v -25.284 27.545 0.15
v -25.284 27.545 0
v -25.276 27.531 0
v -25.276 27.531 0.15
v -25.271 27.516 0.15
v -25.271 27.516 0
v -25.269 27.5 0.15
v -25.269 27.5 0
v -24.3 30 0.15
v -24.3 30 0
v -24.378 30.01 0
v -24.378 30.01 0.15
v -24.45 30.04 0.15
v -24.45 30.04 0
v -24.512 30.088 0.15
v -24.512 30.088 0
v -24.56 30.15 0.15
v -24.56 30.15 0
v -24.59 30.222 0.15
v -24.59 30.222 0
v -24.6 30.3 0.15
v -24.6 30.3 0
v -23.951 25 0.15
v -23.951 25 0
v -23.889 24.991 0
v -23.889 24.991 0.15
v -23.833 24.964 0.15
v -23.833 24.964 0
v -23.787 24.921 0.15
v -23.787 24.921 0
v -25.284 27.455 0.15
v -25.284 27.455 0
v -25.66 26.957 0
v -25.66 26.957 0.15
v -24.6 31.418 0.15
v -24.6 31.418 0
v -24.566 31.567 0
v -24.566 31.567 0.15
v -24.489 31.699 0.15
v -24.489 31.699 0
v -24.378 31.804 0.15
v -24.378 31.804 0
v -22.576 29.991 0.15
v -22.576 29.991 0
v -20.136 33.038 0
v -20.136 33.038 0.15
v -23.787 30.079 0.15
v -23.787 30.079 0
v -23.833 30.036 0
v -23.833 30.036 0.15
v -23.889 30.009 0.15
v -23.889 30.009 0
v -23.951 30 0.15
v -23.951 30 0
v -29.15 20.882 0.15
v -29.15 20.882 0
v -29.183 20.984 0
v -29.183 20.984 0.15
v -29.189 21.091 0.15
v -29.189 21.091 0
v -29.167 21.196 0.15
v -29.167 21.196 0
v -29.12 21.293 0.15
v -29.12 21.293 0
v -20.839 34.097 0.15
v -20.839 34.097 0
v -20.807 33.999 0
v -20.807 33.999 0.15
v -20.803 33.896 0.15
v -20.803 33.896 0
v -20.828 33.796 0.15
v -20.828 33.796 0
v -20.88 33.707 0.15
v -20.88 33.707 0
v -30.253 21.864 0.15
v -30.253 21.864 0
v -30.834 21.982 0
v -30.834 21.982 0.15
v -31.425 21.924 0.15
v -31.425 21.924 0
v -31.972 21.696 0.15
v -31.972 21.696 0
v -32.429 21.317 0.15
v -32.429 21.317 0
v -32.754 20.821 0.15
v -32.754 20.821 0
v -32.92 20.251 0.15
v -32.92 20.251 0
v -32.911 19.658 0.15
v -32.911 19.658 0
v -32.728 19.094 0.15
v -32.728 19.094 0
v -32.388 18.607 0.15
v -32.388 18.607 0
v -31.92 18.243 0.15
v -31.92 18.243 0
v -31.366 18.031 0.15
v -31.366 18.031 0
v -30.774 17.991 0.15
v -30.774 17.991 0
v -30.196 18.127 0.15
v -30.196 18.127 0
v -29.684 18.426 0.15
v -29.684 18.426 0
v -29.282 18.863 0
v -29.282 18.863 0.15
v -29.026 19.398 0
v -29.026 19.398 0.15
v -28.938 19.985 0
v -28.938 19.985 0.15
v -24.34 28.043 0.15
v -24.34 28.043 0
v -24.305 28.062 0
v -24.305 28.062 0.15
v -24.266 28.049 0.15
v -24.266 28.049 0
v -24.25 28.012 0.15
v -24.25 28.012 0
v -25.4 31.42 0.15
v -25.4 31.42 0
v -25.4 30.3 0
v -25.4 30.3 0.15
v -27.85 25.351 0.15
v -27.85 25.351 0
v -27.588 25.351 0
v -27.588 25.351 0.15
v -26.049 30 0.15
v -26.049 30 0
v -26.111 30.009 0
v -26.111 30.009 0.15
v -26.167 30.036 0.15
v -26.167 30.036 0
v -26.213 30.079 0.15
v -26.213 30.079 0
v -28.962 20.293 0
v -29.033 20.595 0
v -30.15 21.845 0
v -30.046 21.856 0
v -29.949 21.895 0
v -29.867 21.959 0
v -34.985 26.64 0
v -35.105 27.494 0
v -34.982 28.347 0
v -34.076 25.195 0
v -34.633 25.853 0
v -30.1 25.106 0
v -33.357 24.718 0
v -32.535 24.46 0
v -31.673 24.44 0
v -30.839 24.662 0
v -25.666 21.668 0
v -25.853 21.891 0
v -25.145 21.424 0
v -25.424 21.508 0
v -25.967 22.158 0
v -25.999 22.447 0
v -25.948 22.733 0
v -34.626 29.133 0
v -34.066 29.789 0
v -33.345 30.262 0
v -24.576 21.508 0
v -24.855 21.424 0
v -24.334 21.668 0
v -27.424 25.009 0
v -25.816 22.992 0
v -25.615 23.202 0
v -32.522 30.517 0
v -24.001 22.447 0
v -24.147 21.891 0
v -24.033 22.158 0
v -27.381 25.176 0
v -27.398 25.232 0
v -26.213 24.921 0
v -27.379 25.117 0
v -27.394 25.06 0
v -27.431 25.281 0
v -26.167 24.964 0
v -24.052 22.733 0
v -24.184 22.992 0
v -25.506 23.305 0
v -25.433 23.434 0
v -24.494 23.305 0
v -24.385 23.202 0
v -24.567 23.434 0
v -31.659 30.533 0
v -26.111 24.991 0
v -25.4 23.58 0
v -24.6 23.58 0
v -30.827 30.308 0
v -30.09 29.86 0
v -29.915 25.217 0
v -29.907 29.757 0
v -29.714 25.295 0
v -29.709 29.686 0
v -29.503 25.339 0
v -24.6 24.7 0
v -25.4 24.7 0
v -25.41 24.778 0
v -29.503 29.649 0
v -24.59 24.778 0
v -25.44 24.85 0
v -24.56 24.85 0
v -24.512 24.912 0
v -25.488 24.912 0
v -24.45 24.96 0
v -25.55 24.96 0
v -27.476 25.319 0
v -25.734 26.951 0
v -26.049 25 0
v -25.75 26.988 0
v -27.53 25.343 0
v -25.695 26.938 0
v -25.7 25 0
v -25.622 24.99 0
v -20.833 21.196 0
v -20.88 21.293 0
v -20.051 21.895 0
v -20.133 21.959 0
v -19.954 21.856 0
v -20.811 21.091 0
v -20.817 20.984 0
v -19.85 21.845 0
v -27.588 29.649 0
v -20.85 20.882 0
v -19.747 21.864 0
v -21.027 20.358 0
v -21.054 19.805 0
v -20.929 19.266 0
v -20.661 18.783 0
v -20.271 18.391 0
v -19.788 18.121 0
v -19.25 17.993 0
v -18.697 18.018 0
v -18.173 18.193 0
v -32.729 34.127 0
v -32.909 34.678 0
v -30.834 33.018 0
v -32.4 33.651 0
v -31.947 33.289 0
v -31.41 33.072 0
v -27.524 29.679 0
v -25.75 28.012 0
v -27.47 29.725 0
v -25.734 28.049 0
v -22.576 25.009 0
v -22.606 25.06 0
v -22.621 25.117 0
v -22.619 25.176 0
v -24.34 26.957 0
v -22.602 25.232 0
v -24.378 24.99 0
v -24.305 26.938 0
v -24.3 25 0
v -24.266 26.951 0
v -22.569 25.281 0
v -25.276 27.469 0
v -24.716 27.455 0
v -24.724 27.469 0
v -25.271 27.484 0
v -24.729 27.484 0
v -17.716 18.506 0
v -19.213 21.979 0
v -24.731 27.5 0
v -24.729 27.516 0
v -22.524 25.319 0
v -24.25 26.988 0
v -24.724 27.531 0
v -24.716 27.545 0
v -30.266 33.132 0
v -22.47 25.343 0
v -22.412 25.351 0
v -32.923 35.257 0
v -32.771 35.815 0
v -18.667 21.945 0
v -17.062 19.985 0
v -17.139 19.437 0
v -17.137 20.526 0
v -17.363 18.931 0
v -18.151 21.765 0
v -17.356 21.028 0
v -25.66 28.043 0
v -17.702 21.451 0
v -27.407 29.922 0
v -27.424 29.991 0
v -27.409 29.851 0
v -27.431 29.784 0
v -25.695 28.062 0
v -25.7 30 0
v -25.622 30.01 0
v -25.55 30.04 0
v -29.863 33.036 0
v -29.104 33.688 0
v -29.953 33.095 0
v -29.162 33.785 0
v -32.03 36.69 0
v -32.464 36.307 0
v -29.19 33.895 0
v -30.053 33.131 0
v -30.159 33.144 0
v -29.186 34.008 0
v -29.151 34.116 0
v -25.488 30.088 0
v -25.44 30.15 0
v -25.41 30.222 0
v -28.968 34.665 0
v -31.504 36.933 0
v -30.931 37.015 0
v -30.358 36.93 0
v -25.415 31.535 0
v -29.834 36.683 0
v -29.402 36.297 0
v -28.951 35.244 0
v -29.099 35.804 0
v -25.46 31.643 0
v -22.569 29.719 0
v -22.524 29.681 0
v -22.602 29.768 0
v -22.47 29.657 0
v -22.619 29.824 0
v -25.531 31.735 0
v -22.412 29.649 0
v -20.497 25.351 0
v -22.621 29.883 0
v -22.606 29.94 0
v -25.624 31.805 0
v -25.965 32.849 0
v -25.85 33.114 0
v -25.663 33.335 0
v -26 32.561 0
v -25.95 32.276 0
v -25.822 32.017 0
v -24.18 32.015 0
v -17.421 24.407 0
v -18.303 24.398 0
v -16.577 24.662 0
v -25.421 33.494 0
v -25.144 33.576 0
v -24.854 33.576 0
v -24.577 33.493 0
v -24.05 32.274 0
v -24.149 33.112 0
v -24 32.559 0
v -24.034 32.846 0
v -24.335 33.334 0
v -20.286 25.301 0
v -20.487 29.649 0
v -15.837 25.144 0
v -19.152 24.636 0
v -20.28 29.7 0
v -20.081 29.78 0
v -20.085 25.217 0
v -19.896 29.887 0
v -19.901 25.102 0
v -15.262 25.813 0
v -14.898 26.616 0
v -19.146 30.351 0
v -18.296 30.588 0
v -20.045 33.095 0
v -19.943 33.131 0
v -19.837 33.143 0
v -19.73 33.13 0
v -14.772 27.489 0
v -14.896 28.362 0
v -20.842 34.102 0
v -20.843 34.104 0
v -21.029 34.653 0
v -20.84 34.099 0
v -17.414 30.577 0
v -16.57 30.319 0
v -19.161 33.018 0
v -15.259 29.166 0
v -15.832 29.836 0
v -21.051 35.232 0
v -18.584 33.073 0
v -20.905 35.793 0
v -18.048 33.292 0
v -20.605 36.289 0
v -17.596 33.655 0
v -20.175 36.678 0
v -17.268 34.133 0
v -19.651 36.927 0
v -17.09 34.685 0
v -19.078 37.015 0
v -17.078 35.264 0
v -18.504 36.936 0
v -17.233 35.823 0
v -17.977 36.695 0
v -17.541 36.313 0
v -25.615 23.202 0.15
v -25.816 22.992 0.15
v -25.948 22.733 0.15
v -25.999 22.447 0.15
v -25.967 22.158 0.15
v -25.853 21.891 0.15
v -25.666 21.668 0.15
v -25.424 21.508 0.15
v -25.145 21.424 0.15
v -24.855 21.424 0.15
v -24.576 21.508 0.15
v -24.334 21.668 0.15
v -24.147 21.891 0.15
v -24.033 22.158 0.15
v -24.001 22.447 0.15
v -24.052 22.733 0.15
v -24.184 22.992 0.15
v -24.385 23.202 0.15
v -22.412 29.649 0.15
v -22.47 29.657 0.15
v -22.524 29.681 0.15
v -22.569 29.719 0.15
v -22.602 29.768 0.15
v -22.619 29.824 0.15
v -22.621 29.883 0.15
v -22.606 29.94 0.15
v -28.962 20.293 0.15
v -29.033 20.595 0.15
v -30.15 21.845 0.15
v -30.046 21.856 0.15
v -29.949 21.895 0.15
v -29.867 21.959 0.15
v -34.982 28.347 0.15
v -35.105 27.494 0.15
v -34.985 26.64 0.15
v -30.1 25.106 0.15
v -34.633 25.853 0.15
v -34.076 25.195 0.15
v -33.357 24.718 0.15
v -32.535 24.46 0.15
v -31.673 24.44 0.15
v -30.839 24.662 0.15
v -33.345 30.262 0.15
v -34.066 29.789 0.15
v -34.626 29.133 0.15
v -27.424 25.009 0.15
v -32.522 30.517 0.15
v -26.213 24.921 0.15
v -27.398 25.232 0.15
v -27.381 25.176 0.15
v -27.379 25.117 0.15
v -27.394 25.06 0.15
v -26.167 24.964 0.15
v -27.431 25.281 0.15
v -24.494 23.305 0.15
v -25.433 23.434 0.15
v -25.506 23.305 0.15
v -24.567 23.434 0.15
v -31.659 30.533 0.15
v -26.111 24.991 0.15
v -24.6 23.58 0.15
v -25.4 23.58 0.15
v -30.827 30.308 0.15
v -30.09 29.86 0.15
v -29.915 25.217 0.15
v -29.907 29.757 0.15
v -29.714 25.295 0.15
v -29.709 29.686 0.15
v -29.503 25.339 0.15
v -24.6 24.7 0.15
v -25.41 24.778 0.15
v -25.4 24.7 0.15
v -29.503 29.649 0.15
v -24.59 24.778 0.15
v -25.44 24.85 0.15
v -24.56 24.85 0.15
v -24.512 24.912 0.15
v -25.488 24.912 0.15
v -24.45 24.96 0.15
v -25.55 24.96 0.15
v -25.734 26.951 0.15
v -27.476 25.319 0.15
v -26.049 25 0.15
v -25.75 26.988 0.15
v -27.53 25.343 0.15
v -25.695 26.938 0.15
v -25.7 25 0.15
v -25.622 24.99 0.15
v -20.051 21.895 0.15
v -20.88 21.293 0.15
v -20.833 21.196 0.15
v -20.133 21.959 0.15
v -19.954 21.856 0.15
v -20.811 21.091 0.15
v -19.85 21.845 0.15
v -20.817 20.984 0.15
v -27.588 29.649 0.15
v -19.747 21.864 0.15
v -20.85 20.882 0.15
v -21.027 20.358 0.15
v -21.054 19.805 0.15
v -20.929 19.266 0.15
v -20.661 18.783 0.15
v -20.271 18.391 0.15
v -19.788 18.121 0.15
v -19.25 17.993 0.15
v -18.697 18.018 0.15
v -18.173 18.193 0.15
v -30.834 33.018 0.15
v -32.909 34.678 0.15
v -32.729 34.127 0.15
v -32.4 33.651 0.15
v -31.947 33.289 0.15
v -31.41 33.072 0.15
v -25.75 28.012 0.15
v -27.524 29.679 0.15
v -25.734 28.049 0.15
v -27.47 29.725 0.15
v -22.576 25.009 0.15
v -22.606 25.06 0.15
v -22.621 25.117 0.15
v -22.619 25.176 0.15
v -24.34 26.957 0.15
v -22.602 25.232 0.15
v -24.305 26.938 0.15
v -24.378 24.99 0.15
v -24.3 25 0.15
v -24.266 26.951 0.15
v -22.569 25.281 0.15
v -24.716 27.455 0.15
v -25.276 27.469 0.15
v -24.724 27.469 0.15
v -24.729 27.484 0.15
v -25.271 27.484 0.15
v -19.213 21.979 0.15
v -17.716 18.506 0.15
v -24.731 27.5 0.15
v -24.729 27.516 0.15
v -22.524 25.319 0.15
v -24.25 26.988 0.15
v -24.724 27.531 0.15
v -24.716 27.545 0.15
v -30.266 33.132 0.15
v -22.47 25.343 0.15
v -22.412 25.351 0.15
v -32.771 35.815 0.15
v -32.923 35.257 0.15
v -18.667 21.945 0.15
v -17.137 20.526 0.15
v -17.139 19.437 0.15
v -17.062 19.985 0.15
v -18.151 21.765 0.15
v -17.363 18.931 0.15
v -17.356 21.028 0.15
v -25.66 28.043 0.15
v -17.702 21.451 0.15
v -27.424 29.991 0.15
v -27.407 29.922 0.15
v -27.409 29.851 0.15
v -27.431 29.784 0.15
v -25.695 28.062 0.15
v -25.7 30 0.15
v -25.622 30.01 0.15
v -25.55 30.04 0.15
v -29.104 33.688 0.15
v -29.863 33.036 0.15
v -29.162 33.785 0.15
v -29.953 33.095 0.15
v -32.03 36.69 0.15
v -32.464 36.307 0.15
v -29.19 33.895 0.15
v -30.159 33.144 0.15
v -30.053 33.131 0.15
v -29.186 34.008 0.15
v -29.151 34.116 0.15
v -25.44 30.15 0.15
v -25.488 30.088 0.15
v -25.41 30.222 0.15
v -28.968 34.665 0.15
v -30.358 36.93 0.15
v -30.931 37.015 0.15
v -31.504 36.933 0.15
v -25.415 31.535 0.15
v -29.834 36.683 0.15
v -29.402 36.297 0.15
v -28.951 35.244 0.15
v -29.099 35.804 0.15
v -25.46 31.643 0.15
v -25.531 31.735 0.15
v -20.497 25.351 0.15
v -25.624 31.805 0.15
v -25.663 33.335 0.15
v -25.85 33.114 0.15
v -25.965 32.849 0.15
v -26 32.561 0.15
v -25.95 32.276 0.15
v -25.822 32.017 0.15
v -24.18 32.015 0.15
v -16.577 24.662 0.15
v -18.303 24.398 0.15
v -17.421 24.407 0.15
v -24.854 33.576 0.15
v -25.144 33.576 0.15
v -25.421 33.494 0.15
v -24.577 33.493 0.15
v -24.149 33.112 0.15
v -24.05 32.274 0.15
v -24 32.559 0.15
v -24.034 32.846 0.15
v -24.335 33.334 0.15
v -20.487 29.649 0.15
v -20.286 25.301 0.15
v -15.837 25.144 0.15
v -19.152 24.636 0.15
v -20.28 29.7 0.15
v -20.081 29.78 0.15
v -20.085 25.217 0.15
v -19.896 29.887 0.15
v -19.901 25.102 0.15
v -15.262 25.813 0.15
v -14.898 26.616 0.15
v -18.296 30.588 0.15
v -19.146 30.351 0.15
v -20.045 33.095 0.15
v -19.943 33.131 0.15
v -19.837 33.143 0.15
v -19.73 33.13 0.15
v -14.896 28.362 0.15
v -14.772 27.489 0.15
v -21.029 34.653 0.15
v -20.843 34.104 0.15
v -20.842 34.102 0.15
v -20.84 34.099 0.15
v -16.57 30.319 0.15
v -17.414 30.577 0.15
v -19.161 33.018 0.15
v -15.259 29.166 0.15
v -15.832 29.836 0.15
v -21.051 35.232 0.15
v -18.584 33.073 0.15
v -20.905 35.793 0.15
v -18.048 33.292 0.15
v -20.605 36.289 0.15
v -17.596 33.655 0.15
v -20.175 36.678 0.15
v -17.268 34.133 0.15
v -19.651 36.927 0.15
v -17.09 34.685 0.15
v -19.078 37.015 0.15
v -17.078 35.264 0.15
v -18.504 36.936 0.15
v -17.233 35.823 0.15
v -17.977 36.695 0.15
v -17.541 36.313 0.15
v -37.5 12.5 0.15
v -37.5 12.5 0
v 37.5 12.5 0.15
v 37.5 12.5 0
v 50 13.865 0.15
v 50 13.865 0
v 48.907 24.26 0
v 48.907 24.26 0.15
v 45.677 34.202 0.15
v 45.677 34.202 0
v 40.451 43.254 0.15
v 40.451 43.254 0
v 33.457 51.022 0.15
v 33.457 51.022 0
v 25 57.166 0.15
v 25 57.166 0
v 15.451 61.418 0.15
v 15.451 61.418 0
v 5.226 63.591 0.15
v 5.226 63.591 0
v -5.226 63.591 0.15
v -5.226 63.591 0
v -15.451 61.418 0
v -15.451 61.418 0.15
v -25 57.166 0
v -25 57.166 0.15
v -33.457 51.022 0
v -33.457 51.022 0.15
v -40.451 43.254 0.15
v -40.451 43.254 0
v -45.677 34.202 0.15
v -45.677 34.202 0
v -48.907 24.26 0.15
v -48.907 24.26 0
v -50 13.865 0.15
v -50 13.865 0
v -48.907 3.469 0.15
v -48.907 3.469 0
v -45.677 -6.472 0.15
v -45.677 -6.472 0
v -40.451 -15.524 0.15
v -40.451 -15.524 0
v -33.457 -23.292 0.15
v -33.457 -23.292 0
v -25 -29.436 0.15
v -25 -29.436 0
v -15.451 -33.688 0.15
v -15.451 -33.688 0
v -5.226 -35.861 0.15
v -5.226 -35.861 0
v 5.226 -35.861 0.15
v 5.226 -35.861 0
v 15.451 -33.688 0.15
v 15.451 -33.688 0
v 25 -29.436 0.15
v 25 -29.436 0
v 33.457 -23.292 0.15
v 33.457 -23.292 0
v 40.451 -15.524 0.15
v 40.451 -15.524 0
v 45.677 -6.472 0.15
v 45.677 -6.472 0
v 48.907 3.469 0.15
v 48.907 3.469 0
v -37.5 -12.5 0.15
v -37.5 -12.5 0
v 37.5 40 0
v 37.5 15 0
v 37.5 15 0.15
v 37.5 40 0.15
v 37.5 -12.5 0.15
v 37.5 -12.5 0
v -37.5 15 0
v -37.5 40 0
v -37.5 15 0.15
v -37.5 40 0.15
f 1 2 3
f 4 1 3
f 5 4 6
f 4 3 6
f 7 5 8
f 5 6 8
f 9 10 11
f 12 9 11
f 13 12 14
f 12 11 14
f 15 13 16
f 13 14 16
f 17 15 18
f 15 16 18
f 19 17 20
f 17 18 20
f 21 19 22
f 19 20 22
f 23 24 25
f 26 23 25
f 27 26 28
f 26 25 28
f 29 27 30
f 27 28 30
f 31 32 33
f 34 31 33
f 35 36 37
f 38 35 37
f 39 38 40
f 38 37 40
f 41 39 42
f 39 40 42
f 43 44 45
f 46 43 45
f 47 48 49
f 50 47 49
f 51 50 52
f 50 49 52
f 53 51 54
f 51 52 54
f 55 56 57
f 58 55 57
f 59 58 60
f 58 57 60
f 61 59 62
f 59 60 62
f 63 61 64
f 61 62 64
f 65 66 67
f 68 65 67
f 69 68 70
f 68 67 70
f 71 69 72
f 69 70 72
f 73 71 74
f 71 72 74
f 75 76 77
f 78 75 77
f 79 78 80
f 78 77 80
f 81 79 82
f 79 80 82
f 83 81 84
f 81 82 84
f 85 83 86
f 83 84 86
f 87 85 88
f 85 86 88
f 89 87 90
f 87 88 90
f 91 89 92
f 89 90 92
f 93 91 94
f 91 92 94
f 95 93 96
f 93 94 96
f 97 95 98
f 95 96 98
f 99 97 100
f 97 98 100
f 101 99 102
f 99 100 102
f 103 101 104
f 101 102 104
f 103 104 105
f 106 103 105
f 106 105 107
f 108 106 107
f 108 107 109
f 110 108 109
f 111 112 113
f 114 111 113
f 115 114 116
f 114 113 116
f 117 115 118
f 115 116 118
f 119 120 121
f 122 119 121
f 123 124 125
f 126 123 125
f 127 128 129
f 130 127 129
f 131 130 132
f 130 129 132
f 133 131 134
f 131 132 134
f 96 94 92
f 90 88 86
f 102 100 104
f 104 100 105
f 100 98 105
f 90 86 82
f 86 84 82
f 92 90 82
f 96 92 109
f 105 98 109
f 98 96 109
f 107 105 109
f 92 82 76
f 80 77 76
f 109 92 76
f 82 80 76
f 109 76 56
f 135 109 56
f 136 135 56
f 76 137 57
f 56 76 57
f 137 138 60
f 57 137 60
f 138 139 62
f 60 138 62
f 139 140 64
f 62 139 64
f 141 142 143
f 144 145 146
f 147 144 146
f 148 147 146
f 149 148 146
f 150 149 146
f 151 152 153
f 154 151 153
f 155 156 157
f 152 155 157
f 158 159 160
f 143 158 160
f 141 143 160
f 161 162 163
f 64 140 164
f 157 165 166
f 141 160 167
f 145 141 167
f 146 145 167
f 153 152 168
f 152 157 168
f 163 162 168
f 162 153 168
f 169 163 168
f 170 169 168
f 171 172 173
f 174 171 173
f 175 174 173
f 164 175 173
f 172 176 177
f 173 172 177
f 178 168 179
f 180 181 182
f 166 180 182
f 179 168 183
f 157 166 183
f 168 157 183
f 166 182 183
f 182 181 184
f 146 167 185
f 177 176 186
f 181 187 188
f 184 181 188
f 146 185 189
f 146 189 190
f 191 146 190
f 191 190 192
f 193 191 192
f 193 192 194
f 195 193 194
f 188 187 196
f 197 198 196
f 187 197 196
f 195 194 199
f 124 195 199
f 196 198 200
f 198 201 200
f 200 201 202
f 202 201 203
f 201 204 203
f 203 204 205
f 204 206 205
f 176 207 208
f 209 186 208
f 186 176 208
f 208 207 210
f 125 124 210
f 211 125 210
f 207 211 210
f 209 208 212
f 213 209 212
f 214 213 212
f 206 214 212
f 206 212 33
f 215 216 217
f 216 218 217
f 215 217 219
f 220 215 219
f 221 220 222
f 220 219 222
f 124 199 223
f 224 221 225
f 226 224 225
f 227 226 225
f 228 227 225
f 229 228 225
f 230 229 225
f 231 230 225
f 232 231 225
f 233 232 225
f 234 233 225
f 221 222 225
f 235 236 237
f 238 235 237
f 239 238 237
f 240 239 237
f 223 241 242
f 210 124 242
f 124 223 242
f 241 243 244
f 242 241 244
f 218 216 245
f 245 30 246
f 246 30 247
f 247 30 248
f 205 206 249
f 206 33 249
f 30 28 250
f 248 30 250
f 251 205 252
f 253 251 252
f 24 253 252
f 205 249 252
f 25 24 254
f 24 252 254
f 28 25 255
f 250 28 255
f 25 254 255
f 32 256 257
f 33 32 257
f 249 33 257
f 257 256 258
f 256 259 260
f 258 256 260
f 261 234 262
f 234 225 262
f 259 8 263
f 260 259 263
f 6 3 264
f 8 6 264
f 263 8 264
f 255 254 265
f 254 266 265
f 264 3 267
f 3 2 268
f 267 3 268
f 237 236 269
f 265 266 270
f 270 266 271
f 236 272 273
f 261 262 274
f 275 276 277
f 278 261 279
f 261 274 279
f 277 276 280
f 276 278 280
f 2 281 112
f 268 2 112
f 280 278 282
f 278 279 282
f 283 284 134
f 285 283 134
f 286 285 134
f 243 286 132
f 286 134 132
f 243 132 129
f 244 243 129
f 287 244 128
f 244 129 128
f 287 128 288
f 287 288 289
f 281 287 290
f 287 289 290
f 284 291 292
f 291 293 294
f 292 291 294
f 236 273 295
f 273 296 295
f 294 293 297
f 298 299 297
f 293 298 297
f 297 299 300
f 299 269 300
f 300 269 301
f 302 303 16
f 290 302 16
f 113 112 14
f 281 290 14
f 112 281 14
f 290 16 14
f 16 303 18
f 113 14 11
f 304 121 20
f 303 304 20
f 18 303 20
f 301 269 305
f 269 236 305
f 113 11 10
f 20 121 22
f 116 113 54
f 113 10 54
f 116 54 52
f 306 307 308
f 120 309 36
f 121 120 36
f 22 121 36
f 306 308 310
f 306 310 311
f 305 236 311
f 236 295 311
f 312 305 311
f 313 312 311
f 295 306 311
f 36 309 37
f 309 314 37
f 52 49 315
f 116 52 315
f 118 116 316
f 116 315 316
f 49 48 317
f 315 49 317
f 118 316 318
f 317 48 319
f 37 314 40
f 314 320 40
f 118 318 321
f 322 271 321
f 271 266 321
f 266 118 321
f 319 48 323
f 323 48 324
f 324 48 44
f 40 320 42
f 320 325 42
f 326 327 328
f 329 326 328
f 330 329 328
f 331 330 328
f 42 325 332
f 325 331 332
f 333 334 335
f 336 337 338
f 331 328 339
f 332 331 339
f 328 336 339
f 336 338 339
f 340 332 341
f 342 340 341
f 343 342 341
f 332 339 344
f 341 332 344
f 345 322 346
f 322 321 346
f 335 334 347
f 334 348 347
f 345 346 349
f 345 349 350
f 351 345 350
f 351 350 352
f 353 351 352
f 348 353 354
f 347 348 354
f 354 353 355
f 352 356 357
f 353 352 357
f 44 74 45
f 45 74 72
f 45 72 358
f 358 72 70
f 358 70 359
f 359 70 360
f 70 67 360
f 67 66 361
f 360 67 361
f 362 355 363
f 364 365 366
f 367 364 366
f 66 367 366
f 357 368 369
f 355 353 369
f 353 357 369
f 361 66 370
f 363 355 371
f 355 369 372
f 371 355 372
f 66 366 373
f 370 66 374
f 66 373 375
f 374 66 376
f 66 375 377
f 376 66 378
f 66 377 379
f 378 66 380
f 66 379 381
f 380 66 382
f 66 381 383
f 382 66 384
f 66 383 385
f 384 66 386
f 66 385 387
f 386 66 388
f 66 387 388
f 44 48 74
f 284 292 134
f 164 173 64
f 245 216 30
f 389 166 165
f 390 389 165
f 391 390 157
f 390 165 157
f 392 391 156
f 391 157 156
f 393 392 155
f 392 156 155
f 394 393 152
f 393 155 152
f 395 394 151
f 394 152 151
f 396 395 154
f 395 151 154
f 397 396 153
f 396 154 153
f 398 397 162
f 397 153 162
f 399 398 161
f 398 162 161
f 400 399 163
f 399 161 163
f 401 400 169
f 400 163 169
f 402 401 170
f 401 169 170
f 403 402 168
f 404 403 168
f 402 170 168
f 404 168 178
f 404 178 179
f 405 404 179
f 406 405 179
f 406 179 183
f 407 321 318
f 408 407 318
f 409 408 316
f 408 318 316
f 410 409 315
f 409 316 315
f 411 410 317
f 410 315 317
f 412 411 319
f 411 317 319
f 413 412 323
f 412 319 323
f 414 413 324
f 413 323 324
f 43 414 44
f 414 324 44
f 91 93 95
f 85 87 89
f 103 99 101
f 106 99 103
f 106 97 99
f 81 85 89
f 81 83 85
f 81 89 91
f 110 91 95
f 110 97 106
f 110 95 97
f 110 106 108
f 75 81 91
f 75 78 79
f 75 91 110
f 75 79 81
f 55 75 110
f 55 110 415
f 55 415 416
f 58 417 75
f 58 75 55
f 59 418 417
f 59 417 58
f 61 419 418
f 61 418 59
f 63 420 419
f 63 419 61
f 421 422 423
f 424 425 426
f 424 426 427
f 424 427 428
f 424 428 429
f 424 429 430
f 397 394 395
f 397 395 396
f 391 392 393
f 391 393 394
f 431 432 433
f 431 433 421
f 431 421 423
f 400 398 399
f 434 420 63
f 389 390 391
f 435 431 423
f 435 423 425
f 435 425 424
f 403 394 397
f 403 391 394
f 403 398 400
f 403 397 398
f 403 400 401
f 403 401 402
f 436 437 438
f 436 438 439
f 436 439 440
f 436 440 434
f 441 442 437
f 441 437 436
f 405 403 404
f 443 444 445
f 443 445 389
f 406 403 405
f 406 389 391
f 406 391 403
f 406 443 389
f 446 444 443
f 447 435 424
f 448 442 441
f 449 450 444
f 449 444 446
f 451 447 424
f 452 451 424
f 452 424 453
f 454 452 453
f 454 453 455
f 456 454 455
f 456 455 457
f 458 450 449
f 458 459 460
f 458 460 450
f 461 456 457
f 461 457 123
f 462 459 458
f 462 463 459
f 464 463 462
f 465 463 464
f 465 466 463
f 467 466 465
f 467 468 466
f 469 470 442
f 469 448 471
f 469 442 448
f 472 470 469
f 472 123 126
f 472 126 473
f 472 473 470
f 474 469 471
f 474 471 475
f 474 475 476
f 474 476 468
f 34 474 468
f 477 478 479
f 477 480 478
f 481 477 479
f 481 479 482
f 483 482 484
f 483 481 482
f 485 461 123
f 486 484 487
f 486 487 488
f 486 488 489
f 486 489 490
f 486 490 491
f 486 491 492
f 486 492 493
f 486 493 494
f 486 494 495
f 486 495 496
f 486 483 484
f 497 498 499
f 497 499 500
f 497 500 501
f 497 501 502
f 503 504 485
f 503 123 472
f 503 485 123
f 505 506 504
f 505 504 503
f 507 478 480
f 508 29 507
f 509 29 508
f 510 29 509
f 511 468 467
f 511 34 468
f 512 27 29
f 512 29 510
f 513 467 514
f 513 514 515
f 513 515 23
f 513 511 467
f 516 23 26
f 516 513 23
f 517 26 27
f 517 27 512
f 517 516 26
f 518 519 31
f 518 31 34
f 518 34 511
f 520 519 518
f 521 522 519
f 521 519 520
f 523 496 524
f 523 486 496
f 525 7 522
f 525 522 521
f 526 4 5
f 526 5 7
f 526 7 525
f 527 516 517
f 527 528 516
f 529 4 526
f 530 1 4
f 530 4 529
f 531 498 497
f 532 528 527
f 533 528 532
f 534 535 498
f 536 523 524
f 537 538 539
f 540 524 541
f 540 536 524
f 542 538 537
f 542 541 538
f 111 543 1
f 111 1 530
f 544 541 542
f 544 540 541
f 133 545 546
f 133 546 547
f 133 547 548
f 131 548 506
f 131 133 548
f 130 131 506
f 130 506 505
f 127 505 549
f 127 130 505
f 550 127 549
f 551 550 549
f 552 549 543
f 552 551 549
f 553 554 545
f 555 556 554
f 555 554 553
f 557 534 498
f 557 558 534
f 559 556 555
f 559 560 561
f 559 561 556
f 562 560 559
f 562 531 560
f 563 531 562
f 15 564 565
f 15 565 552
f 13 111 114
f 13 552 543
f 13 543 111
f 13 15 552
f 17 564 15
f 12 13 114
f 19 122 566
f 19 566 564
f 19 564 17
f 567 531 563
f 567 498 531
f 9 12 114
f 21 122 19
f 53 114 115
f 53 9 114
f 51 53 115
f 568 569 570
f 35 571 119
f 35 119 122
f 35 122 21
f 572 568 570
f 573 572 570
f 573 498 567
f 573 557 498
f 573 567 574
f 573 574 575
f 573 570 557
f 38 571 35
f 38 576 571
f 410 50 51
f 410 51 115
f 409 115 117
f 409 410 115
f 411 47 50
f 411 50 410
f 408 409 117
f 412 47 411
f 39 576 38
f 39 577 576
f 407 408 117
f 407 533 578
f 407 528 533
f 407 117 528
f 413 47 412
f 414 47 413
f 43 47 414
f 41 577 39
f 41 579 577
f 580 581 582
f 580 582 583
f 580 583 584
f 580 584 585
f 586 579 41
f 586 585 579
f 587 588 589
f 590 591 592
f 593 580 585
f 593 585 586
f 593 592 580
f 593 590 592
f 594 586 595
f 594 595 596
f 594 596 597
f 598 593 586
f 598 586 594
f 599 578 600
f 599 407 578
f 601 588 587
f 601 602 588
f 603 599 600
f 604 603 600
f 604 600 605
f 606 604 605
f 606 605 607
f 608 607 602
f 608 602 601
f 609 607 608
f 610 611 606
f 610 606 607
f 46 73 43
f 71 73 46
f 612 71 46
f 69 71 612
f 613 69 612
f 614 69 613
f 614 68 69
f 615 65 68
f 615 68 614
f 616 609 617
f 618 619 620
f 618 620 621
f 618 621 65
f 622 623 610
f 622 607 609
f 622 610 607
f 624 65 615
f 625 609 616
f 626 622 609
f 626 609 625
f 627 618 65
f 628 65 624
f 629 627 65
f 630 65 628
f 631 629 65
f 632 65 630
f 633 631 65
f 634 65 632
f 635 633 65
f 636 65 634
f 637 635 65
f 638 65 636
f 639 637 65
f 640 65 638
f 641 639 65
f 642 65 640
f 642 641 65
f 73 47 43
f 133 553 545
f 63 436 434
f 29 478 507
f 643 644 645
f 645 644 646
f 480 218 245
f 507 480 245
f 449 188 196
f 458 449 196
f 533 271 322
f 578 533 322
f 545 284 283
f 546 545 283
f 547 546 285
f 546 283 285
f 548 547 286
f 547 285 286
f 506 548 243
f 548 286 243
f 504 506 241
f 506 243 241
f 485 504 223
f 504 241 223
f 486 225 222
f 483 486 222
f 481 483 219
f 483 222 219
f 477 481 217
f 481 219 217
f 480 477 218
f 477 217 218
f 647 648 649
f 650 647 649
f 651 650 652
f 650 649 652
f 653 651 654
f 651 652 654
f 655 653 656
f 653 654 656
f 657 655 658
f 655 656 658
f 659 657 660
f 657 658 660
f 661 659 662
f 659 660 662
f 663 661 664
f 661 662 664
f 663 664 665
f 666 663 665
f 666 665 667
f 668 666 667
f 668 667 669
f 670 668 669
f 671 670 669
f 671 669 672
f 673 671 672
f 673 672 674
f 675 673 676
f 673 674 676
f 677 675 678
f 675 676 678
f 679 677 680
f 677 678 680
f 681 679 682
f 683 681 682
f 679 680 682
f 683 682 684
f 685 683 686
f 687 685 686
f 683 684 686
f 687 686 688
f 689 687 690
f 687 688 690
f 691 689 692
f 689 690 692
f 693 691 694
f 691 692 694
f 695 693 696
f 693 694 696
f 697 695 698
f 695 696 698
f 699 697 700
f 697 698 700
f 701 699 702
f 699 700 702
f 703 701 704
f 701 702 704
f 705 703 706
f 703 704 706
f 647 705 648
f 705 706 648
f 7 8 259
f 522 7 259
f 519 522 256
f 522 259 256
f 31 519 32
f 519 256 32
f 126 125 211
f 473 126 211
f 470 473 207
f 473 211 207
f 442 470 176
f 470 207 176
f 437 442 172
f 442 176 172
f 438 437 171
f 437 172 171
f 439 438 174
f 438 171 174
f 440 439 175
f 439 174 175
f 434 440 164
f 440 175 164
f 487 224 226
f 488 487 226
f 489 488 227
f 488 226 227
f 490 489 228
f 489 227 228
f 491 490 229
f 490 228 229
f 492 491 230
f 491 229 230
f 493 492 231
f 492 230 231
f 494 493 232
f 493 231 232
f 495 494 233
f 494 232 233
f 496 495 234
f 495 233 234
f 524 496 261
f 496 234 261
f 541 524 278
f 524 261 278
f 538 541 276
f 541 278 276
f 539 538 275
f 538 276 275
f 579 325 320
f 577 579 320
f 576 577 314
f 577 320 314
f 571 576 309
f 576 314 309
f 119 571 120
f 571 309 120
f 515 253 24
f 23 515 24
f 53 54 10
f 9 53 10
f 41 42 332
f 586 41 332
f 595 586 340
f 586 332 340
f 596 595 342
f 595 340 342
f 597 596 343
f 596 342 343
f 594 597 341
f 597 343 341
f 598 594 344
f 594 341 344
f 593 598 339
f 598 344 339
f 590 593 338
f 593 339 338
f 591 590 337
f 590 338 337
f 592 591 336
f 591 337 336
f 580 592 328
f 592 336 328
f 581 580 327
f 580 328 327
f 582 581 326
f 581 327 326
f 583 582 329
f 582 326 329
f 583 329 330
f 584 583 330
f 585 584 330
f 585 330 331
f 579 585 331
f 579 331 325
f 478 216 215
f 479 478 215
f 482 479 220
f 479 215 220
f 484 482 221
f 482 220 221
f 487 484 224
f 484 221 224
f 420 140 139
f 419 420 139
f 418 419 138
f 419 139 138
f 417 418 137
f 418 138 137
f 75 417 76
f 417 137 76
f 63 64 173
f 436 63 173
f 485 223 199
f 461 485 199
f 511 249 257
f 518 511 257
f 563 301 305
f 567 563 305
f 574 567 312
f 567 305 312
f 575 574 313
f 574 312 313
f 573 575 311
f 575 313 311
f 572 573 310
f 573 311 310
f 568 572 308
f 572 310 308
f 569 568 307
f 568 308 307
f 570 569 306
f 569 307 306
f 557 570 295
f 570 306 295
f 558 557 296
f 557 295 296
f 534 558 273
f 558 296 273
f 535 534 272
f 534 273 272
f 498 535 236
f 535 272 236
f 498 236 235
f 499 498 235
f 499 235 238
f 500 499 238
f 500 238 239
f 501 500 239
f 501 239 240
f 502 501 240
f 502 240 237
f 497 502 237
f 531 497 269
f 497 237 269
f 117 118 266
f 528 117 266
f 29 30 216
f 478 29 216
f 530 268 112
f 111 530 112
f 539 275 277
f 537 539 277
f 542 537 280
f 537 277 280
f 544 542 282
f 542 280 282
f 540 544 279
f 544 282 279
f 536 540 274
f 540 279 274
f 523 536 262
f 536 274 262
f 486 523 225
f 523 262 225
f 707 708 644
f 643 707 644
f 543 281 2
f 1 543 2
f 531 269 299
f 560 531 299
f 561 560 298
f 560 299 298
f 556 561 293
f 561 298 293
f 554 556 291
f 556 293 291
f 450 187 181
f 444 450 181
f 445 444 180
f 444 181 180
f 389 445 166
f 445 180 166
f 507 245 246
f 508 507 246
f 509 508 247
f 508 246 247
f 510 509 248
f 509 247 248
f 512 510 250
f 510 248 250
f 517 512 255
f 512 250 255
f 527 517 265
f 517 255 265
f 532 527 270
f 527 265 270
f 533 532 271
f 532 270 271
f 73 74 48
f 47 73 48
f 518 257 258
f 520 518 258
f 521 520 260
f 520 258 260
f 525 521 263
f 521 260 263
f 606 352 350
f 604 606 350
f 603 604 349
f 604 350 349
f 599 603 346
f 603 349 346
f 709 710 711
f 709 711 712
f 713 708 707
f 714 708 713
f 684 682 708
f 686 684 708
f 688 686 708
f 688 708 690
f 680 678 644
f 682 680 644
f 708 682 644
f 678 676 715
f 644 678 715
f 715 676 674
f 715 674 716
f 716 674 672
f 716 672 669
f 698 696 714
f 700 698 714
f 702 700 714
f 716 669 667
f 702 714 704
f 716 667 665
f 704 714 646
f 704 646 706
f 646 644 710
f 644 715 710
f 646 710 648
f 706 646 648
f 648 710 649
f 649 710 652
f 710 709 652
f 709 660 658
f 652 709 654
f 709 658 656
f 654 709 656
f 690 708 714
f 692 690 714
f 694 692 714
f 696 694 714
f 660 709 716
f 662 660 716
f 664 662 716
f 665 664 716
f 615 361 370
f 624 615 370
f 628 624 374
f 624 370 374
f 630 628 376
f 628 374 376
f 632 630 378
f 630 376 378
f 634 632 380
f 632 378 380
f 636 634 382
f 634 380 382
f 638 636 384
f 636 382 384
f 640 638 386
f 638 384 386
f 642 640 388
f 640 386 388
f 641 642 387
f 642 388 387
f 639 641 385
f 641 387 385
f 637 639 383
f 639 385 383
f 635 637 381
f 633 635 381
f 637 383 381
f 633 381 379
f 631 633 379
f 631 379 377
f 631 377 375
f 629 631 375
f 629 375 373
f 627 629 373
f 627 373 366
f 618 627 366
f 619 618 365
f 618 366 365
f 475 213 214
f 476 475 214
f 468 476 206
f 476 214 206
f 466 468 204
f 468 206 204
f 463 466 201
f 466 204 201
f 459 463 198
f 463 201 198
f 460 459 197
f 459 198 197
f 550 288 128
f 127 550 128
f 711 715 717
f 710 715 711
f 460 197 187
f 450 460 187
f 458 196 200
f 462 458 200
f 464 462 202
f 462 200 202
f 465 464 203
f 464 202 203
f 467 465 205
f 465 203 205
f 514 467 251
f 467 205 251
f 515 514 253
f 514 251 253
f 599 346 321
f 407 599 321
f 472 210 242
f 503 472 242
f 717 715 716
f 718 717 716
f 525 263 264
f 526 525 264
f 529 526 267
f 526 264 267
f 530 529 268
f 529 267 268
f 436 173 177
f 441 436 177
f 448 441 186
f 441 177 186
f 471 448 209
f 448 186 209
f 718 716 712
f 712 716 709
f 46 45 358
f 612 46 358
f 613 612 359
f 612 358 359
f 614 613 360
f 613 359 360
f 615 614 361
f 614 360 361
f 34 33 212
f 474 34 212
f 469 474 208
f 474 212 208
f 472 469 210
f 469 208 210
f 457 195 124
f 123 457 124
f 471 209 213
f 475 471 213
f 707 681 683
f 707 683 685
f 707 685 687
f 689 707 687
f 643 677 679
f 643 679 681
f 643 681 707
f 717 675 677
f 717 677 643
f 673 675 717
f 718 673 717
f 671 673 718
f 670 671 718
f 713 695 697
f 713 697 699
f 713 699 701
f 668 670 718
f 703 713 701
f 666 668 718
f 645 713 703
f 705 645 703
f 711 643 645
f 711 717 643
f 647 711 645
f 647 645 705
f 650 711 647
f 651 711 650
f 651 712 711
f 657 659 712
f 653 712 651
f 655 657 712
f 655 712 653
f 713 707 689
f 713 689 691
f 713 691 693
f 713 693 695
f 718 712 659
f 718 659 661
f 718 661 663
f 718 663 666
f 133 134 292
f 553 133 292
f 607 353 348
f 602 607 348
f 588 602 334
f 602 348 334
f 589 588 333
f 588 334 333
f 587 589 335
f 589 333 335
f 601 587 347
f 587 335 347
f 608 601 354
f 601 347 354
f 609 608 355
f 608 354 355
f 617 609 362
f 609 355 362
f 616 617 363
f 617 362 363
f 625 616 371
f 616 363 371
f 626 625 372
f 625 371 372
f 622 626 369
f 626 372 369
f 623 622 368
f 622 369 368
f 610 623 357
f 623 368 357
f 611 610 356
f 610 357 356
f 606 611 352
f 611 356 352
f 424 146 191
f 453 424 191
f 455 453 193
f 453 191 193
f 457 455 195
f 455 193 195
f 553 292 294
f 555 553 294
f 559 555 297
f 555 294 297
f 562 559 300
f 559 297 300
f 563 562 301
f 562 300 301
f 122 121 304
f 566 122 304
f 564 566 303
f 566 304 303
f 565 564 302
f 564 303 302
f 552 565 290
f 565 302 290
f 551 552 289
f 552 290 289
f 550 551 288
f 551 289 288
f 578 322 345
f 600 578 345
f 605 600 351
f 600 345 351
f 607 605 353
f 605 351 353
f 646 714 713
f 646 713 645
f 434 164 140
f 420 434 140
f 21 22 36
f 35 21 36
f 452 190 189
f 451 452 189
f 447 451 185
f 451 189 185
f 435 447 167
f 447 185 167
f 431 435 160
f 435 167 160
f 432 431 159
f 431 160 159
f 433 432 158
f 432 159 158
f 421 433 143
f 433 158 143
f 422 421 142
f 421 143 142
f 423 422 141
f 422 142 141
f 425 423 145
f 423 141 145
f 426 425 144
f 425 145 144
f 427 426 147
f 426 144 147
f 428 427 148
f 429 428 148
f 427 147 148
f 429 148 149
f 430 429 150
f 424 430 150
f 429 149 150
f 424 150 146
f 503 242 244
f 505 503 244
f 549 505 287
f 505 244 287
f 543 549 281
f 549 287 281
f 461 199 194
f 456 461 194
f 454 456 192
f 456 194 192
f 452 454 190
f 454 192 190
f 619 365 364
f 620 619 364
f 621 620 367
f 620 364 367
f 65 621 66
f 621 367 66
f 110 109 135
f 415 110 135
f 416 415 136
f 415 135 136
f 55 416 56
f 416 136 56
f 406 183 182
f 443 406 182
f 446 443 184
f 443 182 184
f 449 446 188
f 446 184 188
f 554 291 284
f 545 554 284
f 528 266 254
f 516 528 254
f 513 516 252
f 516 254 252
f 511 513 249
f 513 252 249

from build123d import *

# Parameters (mm, degrees)
F0_R     = 50
F0_W     = 75
F0_H     = 25
F1_DEPTH = 0.15


with BuildPart() as f1:
    # F0 (on Top) → F1 (new body)
    with BuildSketch(Plane.XY):
        with Locations((0, 13.864864)):
            Circle(F0_R)
        Rectangle(F0_W, F0_H, mode=Mode.SUBTRACT)
        with Locations((0, 27.5)):
            Rectangle(F0_W, F0_H, mode=Mode.SUBTRACT)
        with BuildLine():
            ThreePointArc((-19.730074, 33.13012), (-17.74507, 36.520228), (-20.842872, 34.104302))
            ThreePointArc((-20.842872, 34.104302), (-20.786492, 34.001656), (-20.724202, 33.902485))
            ThreePointArc((-20.724202, 33.902485), (-20.392678, 33.521916), (-19.976437, 33.23646))
            ThreePointArc((-19.976437, 33.23646), (-19.855041, 33.179154), (-19.730074, 33.13012))
        make_face()
        with BuildLine():
            ThreePointArc((-19.900965, 25.102336), (-14.772092, 27.489052), (-19.895844, 29.886743))
            ThreePointArc((-19.895844, 29.886743), (-19.991897, 29.803022), (-20.084453, 29.71545))
            ThreePointArc((-20.084453, 29.71545), (-20.130847, 29.646829), (-20.147154, 29.565618))
            Line((-20.147154, 29.565618), (-20.147154, 25.419169))
            ThreePointArc((-20.147154, 25.419169), (-20.130847, 25.337957), (-20.084453, 25.269336))
            ThreePointArc((-20.084453, 25.269336), (-19.994369, 25.184012), (-19.900965, 25.102336))
        make_face()
        with BuildLine():
            ThreePointArc((-19.747364, 21.863667), (-20.392678, 21.478084), (-20.850062, 20.881508))
            ThreePointArc((-20.850062, 20.881508), (-19.523305, 18.038422), (-17.06245, 19.9846))
            ThreePointArc((-17.06245, 19.9846), (-17.915678, 21.623171), (-19.747364, 21.863667))
        make_face()
        with BuildLine():
            ThreePointArc((-29.914627, 29.70432), (-30.000846, 29.783725), (-30.090035, 29.859779))
            ThreePointArc((-30.090035, 29.859779), (-35.104621, 27.494006), (-30.100424, 25.106337))
            ThreePointArc((-30.100424, 25.106337), (-30.00587, 25.186432), (-29.914627, 25.270279))
            ThreePointArc((-29.914627, 25.270279), (-29.86661, 25.339634), (-29.849699, 25.422276))
            Line((-29.849699, 25.422276), (-29.849699, 29.552324))
            ThreePointArc((-29.849699, 29.552324), (-29.86661, 29.634966), (-29.914627, 29.70432))
        make_face()
        with BuildLine():
            ThreePointArc((-29.151426, 34.115534), (-32.261302, 36.514626), (-30.265805, 33.131585))
            ThreePointArc((-30.265805, 33.131585), (-30.142952, 33.180021), (-30.023563, 33.23646))
            ThreePointArc((-30.023563, 33.23646), (-29.517746, 33.606799), (-29.151426, 34.115534))
        make_face()
        with BuildLine():
            ThreePointArc((-27.15, 29.43851), (-27.222221, 29.746727), (-27.423848, 29.990777))
            ThreePointArc((-27.423848, 29.990777), (-27.43109, 29.783881), (-27.588044, 29.648885))
            Line((-27.588044, 29.648885), (-29.502973, 29.648885))
            ThreePointArc((-29.502973, 29.648885), (-29.809674, 29.717671), (-30.090035, 29.859779))
            ThreePointArc((-30.090035, 29.859779), (-30.000846, 29.783725), (-29.914627, 29.70432))
            ThreePointArc((-29.914627, 29.70432), (-29.86661, 29.634966), (-29.849699, 29.552324))
            Line((-29.849699, 29.552324), (-29.849699, 25.422276))
            ThreePointArc((-29.849699, 25.422276), (-29.86661, 25.339634), (-29.914627, 25.270279))
            ThreePointArc((-29.914627, 25.270279), (-30.00587, 25.186432), (-30.100424, 25.106337))
            ThreePointArc((-30.100424, 25.106337), (-29.816251, 25.260053), (-29.502846, 25.338542))
            Line((-29.502846, 25.338542), (-27.85, 25.351115))
            Line((-27.85, 25.351115), (-27.588044, 25.351115))
            ThreePointArc((-27.588044, 25.351115), (-27.398406, 25.231816), (-27.423848, 25.009223))
            ThreePointArc((-27.423848, 25.009223), (-27.257124, 25.27058), (-27.15, 25.56149))
            Line((-27.15, 25.56149), (-27.15, 29.43851))
        make_face()
        with BuildLine():
            Line((-29.863001, 33.036003), (-27.423848, 29.990777))
            ThreePointArc((-27.423848, 29.990777), (-27.222221, 29.746727), (-27.15, 29.43851))
            Line((-27.15, 29.43851), (-27.15, 25.56149))
            ThreePointArc((-27.15, 25.56149), (-27.257124, 25.27058), (-27.423848, 25.009223))
            Line((-27.423848, 25.009223), (-29.867273, 21.958664))
            ThreePointArc((-29.867273, 21.958664), (-30.046268, 21.855647), (-30.252636, 21.863667))
            ThreePointArc((-30.252636, 21.863667), (-29.607322, 21.478084), (-29.149938, 20.881508))
            ThreePointArc((-29.149938, 20.881508), (-29.188531, 21.091056), (-29.119508, 21.29264))
            Line((-29.119508, 21.29264), (-26.213163, 24.921143))
            ThreePointArc((-26.213163, 24.921143), (-26.140041, 24.979264), (-26.048966, 25))
            Line((-26.048966, 25), (-25.960375, 25))
            ThreePointArc((-25.960375, 25), (-25.811617, 25.061617), (-25.75, 25.210375))
            Line((-25.75, 25.210375), (-25.75, 26.987622))
            Line((-25.75, 26.987622), (-25.75, 28.012378))
            Line((-25.75, 28.012378), (-25.75, 29.789625))
            ThreePointArc((-25.75, 29.789625), (-25.811617, 29.938383), (-25.960375, 30))
            Line((-25.960375, 30), (-26.048966, 30))
            ThreePointArc((-26.048966, 30), (-26.140041, 30.020736), (-26.213163, 30.078857))
            Line((-26.213163, 30.078857), (-29.103915, 33.687892))
            ThreePointArc((-29.103915, 33.687892), (-29.189698, 33.894822), (-29.151426, 34.115534))
            ThreePointArc((-29.151426, 34.115534), (-29.517746, 33.606799), (-30.023563, 33.23646))
            ThreePointArc((-30.023563, 33.23646), (-30.142952, 33.180021), (-30.265805, 33.131585))
            ThreePointArc((-30.265805, 33.131585), (-30.053194, 33.131033), (-29.863001, 33.036003))
        make_face()
        with BuildLine():
            Line((-25.75, 30), (-25.960375, 30))
            ThreePointArc((-25.960375, 30), (-25.811617, 29.938383), (-25.75, 29.789625))
            Line((-25.75, 29.789625), (-25.75, 28.012378))
            ThreePointArc((-25.75, 28.012378), (-25.715901, 28.059783), (-25.660114, 28.04253))
            Line((-25.660114, 28.04253), (-25.283807, 27.544723))
            ThreePointArc((-25.283807, 27.544723), (-25.272656, 27.523586), (-25.268806, 27.5))
            ThreePointArc((-25.268806, 27.5), (-25.272656, 27.476414), (-25.283807, 27.455277))
            Line((-25.283807, 27.455277), (-25.660114, 26.95747))
            ThreePointArc((-25.660114, 26.95747), (-25.715901, 26.940217), (-25.75, 26.987622))
            Line((-25.75, 26.987622), (-25.75, 25.210375))
            ThreePointArc((-25.75, 25.210375), (-25.811617, 25.061617), (-25.960375, 25))
            Line((-25.960375, 25), (-25.75, 25))
            Line((-25.75, 25), (-25.7, 25))
            ThreePointArc((-25.7, 25), (-25.487868, 24.912132), (-25.4, 24.7))
            Line((-25.4, 24.7), (-25.4, 24.505414))
            Line((-25.4, 24.505414), (-25.4, 23.579877))
            ThreePointArc((-25.4, 23.579877), (-25.464698, 23.366661), (-25.614832, 23.20202))
            ThreePointArc((-25.614832, 23.20202), (-25, 21.413362), (-24.385168, 23.20202))
            ThreePointArc((-24.385168, 23.20202), (-24.535302, 23.366661), (-24.6, 23.579877))
            Line((-24.6, 23.579877), (-24.6, 24.7))
            ThreePointArc((-24.6, 24.7), (-24.512132, 24.912132), (-24.3, 25))
            Line((-24.3, 25), (-24.25, 25))
            Line((-24.25, 25), (-24.039625, 25))
            ThreePointArc((-24.039625, 25), (-24.188383, 25.061617), (-24.25, 25.210375))
            Line((-24.25, 25.210375), (-24.25, 26.813685))
            Line((-24.25, 26.813685), (-24.25, 26.987622))
            ThreePointArc((-24.25, 26.987622), (-24.284099, 26.940217), (-24.339886, 26.95747))
            Line((-24.339886, 26.95747), (-24.716193, 27.455277))
            ThreePointArc((-24.716193, 27.455277), (-24.727344, 27.476414), (-24.731194, 27.5))
            ThreePointArc((-24.731194, 27.5), (-24.727344, 27.523586), (-24.716193, 27.544723))
            Line((-24.716193, 27.544723), (-24.339886, 28.04253))
            ThreePointArc((-24.339886, 28.04253), (-24.284099, 28.059783), (-24.25, 28.012378))
            Line((-24.25, 28.012378), (-24.25, 28.186315))
            Line((-24.25, 28.186315), (-24.25, 29.789625))
            ThreePointArc((-24.25, 29.789625), (-24.188383, 29.938383), (-24.039625, 30))
            Line((-24.039625, 30), (-24.25, 30))
            Line((-24.25, 30), (-24.3, 30))
            ThreePointArc((-24.3, 30), (-24.512132, 30.087868), (-24.6, 30.3))
            Line((-24.6, 30.3), (-24.6, 31.418189))
            ThreePointArc((-24.6, 31.418189), (-24.532507, 31.636102), (-24.377815, 31.803768))
            ThreePointArc((-24.377815, 31.803768), (-24.998799, 33.586637), (-25.624063, 31.805264))
            ThreePointArc((-25.624063, 31.805264), (-25.46008, 31.642566), (-25.4, 31.419516))
            Line((-25.4, 31.419516), (-25.4, 30.494586))
            Line((-25.4, 30.494586), (-25.4, 30.3))
            ThreePointArc((-25.4, 30.3), (-25.487868, 30.087868), (-25.7, 30))
            Line((-25.7, 30), (-25.75, 30))
        make_face()
        with BuildLine():
            Line((-23.951034, 30), (-24.039625, 30))
            ThreePointArc((-24.039625, 30), (-24.188383, 29.938383), (-24.25, 29.789625))
            Line((-24.25, 29.789625), (-24.25, 28.186315))
            Line((-24.25, 28.186315), (-24.25, 28.012378))
            Line((-24.25, 28.012378), (-24.25, 27.5))
            Line((-24.25, 27.5), (-24.25, 26.987622))
            Line((-24.25, 26.987622), (-24.25, 26.813685))
            Line((-24.25, 26.813685), (-24.25, 25.210375))
            ThreePointArc((-24.25, 25.210375), (-24.188383, 25.061617), (-24.039625, 25))
            Line((-24.039625, 25), (-23.951034, 25))
            ThreePointArc((-23.951034, 25), (-23.859959, 24.979264), (-23.786837, 24.921143))
            Line((-23.786837, 24.921143), (-20.880492, 21.29264))
            ThreePointArc((-20.880492, 21.29264), (-20.811469, 21.091056), (-20.850062, 20.881508))
            ThreePointArc((-20.850062, 20.881508), (-20.392678, 21.478084), (-19.747364, 21.863667))
            ThreePointArc((-19.747364, 21.863667), (-19.953732, 21.855647), (-20.132727, 21.958664))
            Line((-20.132727, 21.958664), (-22.576152, 25.009223))
            ThreePointArc((-22.576152, 25.009223), (-22.742876, 25.27058), (-22.85, 25.56149))
            Line((-22.85, 25.56149), (-22.85, 29.43851))
            ThreePointArc((-22.85, 29.43851), (-22.777779, 29.746727), (-22.576152, 29.990777))
            Line((-22.576152, 29.990777), (-20.135555, 33.037805))
            ThreePointArc((-20.135555, 33.037805), (-19.943481, 33.130813), (-19.730074, 33.13012))
            ThreePointArc((-19.730074, 33.13012), (-19.855041, 33.179154), (-19.976437, 33.23646))
            ThreePointArc((-19.976437, 33.23646), (-20.392678, 33.521916), (-20.724202, 33.902485))
            ThreePointArc((-20.724202, 33.902485), (-20.786492, 34.001656), (-20.842872, 34.104302))
            ThreePointArc((-20.842872, 34.104302), (-20.802325, 33.900264), (-20.88042, 33.707451))
            Line((-20.88042, 33.707451), (-23.786837, 30.078857))
            ThreePointArc((-23.786837, 30.078857), (-23.859959, 30.020736), (-23.951034, 30))
        make_face()
        with BuildLine():
            ThreePointArc((-22.411956, 29.648885), (-22.601594, 29.768184), (-22.576152, 29.990777))
            ThreePointArc((-22.576152, 29.990777), (-22.777779, 29.746727), (-22.85, 29.43851))
            Line((-22.85, 29.43851), (-22.85, 25.56149))
            ThreePointArc((-22.85, 25.56149), (-22.742876, 25.27058), (-22.576152, 25.009223))
            ThreePointArc((-22.576152, 25.009223), (-22.601594, 25.231816), (-22.411956, 25.351115))
            Line((-22.411956, 25.351115), (-20.497154, 25.351115))
            ThreePointArc((-20.497154, 25.351115), (-20.18386, 25.263151), (-19.900965, 25.102336))
            ThreePointArc((-19.900965, 25.102336), (-19.994369, 25.184012), (-20.084453, 25.269336))
            ThreePointArc((-20.084453, 25.269336), (-20.130847, 25.337957), (-20.147154, 25.419169))
            Line((-20.147154, 25.419169), (-20.147154, 29.565618))
            ThreePointArc((-20.147154, 29.565618), (-20.130847, 29.646829), (-20.084453, 29.71545))
            ThreePointArc((-20.084453, 29.71545), (-19.991897, 29.803022), (-19.895844, 29.886743))
            ThreePointArc((-19.895844, 29.886743), (-20.179056, 29.736486), (-20.487459, 29.648885))
            Line((-20.487459, 29.648885), (-22.15, 29.648885))
            Line((-22.15, 29.648885), (-22.411956, 29.648885))
        make_face()
        with BuildLine():
            ThreePointArc((-29.149938, 20.881508), (-29.607322, 21.478084), (-30.252636, 21.863667))
            ThreePointArc((-30.252636, 21.863667), (-32.576121, 18.837828), (-28.93755, 19.9846))
            ThreePointArc((-28.93755, 19.9846), (-28.991371, 20.445456), (-29.149938, 20.881508))
        make_face()
    extrude(amount=F1_DEPTH)


solid = f1.part
